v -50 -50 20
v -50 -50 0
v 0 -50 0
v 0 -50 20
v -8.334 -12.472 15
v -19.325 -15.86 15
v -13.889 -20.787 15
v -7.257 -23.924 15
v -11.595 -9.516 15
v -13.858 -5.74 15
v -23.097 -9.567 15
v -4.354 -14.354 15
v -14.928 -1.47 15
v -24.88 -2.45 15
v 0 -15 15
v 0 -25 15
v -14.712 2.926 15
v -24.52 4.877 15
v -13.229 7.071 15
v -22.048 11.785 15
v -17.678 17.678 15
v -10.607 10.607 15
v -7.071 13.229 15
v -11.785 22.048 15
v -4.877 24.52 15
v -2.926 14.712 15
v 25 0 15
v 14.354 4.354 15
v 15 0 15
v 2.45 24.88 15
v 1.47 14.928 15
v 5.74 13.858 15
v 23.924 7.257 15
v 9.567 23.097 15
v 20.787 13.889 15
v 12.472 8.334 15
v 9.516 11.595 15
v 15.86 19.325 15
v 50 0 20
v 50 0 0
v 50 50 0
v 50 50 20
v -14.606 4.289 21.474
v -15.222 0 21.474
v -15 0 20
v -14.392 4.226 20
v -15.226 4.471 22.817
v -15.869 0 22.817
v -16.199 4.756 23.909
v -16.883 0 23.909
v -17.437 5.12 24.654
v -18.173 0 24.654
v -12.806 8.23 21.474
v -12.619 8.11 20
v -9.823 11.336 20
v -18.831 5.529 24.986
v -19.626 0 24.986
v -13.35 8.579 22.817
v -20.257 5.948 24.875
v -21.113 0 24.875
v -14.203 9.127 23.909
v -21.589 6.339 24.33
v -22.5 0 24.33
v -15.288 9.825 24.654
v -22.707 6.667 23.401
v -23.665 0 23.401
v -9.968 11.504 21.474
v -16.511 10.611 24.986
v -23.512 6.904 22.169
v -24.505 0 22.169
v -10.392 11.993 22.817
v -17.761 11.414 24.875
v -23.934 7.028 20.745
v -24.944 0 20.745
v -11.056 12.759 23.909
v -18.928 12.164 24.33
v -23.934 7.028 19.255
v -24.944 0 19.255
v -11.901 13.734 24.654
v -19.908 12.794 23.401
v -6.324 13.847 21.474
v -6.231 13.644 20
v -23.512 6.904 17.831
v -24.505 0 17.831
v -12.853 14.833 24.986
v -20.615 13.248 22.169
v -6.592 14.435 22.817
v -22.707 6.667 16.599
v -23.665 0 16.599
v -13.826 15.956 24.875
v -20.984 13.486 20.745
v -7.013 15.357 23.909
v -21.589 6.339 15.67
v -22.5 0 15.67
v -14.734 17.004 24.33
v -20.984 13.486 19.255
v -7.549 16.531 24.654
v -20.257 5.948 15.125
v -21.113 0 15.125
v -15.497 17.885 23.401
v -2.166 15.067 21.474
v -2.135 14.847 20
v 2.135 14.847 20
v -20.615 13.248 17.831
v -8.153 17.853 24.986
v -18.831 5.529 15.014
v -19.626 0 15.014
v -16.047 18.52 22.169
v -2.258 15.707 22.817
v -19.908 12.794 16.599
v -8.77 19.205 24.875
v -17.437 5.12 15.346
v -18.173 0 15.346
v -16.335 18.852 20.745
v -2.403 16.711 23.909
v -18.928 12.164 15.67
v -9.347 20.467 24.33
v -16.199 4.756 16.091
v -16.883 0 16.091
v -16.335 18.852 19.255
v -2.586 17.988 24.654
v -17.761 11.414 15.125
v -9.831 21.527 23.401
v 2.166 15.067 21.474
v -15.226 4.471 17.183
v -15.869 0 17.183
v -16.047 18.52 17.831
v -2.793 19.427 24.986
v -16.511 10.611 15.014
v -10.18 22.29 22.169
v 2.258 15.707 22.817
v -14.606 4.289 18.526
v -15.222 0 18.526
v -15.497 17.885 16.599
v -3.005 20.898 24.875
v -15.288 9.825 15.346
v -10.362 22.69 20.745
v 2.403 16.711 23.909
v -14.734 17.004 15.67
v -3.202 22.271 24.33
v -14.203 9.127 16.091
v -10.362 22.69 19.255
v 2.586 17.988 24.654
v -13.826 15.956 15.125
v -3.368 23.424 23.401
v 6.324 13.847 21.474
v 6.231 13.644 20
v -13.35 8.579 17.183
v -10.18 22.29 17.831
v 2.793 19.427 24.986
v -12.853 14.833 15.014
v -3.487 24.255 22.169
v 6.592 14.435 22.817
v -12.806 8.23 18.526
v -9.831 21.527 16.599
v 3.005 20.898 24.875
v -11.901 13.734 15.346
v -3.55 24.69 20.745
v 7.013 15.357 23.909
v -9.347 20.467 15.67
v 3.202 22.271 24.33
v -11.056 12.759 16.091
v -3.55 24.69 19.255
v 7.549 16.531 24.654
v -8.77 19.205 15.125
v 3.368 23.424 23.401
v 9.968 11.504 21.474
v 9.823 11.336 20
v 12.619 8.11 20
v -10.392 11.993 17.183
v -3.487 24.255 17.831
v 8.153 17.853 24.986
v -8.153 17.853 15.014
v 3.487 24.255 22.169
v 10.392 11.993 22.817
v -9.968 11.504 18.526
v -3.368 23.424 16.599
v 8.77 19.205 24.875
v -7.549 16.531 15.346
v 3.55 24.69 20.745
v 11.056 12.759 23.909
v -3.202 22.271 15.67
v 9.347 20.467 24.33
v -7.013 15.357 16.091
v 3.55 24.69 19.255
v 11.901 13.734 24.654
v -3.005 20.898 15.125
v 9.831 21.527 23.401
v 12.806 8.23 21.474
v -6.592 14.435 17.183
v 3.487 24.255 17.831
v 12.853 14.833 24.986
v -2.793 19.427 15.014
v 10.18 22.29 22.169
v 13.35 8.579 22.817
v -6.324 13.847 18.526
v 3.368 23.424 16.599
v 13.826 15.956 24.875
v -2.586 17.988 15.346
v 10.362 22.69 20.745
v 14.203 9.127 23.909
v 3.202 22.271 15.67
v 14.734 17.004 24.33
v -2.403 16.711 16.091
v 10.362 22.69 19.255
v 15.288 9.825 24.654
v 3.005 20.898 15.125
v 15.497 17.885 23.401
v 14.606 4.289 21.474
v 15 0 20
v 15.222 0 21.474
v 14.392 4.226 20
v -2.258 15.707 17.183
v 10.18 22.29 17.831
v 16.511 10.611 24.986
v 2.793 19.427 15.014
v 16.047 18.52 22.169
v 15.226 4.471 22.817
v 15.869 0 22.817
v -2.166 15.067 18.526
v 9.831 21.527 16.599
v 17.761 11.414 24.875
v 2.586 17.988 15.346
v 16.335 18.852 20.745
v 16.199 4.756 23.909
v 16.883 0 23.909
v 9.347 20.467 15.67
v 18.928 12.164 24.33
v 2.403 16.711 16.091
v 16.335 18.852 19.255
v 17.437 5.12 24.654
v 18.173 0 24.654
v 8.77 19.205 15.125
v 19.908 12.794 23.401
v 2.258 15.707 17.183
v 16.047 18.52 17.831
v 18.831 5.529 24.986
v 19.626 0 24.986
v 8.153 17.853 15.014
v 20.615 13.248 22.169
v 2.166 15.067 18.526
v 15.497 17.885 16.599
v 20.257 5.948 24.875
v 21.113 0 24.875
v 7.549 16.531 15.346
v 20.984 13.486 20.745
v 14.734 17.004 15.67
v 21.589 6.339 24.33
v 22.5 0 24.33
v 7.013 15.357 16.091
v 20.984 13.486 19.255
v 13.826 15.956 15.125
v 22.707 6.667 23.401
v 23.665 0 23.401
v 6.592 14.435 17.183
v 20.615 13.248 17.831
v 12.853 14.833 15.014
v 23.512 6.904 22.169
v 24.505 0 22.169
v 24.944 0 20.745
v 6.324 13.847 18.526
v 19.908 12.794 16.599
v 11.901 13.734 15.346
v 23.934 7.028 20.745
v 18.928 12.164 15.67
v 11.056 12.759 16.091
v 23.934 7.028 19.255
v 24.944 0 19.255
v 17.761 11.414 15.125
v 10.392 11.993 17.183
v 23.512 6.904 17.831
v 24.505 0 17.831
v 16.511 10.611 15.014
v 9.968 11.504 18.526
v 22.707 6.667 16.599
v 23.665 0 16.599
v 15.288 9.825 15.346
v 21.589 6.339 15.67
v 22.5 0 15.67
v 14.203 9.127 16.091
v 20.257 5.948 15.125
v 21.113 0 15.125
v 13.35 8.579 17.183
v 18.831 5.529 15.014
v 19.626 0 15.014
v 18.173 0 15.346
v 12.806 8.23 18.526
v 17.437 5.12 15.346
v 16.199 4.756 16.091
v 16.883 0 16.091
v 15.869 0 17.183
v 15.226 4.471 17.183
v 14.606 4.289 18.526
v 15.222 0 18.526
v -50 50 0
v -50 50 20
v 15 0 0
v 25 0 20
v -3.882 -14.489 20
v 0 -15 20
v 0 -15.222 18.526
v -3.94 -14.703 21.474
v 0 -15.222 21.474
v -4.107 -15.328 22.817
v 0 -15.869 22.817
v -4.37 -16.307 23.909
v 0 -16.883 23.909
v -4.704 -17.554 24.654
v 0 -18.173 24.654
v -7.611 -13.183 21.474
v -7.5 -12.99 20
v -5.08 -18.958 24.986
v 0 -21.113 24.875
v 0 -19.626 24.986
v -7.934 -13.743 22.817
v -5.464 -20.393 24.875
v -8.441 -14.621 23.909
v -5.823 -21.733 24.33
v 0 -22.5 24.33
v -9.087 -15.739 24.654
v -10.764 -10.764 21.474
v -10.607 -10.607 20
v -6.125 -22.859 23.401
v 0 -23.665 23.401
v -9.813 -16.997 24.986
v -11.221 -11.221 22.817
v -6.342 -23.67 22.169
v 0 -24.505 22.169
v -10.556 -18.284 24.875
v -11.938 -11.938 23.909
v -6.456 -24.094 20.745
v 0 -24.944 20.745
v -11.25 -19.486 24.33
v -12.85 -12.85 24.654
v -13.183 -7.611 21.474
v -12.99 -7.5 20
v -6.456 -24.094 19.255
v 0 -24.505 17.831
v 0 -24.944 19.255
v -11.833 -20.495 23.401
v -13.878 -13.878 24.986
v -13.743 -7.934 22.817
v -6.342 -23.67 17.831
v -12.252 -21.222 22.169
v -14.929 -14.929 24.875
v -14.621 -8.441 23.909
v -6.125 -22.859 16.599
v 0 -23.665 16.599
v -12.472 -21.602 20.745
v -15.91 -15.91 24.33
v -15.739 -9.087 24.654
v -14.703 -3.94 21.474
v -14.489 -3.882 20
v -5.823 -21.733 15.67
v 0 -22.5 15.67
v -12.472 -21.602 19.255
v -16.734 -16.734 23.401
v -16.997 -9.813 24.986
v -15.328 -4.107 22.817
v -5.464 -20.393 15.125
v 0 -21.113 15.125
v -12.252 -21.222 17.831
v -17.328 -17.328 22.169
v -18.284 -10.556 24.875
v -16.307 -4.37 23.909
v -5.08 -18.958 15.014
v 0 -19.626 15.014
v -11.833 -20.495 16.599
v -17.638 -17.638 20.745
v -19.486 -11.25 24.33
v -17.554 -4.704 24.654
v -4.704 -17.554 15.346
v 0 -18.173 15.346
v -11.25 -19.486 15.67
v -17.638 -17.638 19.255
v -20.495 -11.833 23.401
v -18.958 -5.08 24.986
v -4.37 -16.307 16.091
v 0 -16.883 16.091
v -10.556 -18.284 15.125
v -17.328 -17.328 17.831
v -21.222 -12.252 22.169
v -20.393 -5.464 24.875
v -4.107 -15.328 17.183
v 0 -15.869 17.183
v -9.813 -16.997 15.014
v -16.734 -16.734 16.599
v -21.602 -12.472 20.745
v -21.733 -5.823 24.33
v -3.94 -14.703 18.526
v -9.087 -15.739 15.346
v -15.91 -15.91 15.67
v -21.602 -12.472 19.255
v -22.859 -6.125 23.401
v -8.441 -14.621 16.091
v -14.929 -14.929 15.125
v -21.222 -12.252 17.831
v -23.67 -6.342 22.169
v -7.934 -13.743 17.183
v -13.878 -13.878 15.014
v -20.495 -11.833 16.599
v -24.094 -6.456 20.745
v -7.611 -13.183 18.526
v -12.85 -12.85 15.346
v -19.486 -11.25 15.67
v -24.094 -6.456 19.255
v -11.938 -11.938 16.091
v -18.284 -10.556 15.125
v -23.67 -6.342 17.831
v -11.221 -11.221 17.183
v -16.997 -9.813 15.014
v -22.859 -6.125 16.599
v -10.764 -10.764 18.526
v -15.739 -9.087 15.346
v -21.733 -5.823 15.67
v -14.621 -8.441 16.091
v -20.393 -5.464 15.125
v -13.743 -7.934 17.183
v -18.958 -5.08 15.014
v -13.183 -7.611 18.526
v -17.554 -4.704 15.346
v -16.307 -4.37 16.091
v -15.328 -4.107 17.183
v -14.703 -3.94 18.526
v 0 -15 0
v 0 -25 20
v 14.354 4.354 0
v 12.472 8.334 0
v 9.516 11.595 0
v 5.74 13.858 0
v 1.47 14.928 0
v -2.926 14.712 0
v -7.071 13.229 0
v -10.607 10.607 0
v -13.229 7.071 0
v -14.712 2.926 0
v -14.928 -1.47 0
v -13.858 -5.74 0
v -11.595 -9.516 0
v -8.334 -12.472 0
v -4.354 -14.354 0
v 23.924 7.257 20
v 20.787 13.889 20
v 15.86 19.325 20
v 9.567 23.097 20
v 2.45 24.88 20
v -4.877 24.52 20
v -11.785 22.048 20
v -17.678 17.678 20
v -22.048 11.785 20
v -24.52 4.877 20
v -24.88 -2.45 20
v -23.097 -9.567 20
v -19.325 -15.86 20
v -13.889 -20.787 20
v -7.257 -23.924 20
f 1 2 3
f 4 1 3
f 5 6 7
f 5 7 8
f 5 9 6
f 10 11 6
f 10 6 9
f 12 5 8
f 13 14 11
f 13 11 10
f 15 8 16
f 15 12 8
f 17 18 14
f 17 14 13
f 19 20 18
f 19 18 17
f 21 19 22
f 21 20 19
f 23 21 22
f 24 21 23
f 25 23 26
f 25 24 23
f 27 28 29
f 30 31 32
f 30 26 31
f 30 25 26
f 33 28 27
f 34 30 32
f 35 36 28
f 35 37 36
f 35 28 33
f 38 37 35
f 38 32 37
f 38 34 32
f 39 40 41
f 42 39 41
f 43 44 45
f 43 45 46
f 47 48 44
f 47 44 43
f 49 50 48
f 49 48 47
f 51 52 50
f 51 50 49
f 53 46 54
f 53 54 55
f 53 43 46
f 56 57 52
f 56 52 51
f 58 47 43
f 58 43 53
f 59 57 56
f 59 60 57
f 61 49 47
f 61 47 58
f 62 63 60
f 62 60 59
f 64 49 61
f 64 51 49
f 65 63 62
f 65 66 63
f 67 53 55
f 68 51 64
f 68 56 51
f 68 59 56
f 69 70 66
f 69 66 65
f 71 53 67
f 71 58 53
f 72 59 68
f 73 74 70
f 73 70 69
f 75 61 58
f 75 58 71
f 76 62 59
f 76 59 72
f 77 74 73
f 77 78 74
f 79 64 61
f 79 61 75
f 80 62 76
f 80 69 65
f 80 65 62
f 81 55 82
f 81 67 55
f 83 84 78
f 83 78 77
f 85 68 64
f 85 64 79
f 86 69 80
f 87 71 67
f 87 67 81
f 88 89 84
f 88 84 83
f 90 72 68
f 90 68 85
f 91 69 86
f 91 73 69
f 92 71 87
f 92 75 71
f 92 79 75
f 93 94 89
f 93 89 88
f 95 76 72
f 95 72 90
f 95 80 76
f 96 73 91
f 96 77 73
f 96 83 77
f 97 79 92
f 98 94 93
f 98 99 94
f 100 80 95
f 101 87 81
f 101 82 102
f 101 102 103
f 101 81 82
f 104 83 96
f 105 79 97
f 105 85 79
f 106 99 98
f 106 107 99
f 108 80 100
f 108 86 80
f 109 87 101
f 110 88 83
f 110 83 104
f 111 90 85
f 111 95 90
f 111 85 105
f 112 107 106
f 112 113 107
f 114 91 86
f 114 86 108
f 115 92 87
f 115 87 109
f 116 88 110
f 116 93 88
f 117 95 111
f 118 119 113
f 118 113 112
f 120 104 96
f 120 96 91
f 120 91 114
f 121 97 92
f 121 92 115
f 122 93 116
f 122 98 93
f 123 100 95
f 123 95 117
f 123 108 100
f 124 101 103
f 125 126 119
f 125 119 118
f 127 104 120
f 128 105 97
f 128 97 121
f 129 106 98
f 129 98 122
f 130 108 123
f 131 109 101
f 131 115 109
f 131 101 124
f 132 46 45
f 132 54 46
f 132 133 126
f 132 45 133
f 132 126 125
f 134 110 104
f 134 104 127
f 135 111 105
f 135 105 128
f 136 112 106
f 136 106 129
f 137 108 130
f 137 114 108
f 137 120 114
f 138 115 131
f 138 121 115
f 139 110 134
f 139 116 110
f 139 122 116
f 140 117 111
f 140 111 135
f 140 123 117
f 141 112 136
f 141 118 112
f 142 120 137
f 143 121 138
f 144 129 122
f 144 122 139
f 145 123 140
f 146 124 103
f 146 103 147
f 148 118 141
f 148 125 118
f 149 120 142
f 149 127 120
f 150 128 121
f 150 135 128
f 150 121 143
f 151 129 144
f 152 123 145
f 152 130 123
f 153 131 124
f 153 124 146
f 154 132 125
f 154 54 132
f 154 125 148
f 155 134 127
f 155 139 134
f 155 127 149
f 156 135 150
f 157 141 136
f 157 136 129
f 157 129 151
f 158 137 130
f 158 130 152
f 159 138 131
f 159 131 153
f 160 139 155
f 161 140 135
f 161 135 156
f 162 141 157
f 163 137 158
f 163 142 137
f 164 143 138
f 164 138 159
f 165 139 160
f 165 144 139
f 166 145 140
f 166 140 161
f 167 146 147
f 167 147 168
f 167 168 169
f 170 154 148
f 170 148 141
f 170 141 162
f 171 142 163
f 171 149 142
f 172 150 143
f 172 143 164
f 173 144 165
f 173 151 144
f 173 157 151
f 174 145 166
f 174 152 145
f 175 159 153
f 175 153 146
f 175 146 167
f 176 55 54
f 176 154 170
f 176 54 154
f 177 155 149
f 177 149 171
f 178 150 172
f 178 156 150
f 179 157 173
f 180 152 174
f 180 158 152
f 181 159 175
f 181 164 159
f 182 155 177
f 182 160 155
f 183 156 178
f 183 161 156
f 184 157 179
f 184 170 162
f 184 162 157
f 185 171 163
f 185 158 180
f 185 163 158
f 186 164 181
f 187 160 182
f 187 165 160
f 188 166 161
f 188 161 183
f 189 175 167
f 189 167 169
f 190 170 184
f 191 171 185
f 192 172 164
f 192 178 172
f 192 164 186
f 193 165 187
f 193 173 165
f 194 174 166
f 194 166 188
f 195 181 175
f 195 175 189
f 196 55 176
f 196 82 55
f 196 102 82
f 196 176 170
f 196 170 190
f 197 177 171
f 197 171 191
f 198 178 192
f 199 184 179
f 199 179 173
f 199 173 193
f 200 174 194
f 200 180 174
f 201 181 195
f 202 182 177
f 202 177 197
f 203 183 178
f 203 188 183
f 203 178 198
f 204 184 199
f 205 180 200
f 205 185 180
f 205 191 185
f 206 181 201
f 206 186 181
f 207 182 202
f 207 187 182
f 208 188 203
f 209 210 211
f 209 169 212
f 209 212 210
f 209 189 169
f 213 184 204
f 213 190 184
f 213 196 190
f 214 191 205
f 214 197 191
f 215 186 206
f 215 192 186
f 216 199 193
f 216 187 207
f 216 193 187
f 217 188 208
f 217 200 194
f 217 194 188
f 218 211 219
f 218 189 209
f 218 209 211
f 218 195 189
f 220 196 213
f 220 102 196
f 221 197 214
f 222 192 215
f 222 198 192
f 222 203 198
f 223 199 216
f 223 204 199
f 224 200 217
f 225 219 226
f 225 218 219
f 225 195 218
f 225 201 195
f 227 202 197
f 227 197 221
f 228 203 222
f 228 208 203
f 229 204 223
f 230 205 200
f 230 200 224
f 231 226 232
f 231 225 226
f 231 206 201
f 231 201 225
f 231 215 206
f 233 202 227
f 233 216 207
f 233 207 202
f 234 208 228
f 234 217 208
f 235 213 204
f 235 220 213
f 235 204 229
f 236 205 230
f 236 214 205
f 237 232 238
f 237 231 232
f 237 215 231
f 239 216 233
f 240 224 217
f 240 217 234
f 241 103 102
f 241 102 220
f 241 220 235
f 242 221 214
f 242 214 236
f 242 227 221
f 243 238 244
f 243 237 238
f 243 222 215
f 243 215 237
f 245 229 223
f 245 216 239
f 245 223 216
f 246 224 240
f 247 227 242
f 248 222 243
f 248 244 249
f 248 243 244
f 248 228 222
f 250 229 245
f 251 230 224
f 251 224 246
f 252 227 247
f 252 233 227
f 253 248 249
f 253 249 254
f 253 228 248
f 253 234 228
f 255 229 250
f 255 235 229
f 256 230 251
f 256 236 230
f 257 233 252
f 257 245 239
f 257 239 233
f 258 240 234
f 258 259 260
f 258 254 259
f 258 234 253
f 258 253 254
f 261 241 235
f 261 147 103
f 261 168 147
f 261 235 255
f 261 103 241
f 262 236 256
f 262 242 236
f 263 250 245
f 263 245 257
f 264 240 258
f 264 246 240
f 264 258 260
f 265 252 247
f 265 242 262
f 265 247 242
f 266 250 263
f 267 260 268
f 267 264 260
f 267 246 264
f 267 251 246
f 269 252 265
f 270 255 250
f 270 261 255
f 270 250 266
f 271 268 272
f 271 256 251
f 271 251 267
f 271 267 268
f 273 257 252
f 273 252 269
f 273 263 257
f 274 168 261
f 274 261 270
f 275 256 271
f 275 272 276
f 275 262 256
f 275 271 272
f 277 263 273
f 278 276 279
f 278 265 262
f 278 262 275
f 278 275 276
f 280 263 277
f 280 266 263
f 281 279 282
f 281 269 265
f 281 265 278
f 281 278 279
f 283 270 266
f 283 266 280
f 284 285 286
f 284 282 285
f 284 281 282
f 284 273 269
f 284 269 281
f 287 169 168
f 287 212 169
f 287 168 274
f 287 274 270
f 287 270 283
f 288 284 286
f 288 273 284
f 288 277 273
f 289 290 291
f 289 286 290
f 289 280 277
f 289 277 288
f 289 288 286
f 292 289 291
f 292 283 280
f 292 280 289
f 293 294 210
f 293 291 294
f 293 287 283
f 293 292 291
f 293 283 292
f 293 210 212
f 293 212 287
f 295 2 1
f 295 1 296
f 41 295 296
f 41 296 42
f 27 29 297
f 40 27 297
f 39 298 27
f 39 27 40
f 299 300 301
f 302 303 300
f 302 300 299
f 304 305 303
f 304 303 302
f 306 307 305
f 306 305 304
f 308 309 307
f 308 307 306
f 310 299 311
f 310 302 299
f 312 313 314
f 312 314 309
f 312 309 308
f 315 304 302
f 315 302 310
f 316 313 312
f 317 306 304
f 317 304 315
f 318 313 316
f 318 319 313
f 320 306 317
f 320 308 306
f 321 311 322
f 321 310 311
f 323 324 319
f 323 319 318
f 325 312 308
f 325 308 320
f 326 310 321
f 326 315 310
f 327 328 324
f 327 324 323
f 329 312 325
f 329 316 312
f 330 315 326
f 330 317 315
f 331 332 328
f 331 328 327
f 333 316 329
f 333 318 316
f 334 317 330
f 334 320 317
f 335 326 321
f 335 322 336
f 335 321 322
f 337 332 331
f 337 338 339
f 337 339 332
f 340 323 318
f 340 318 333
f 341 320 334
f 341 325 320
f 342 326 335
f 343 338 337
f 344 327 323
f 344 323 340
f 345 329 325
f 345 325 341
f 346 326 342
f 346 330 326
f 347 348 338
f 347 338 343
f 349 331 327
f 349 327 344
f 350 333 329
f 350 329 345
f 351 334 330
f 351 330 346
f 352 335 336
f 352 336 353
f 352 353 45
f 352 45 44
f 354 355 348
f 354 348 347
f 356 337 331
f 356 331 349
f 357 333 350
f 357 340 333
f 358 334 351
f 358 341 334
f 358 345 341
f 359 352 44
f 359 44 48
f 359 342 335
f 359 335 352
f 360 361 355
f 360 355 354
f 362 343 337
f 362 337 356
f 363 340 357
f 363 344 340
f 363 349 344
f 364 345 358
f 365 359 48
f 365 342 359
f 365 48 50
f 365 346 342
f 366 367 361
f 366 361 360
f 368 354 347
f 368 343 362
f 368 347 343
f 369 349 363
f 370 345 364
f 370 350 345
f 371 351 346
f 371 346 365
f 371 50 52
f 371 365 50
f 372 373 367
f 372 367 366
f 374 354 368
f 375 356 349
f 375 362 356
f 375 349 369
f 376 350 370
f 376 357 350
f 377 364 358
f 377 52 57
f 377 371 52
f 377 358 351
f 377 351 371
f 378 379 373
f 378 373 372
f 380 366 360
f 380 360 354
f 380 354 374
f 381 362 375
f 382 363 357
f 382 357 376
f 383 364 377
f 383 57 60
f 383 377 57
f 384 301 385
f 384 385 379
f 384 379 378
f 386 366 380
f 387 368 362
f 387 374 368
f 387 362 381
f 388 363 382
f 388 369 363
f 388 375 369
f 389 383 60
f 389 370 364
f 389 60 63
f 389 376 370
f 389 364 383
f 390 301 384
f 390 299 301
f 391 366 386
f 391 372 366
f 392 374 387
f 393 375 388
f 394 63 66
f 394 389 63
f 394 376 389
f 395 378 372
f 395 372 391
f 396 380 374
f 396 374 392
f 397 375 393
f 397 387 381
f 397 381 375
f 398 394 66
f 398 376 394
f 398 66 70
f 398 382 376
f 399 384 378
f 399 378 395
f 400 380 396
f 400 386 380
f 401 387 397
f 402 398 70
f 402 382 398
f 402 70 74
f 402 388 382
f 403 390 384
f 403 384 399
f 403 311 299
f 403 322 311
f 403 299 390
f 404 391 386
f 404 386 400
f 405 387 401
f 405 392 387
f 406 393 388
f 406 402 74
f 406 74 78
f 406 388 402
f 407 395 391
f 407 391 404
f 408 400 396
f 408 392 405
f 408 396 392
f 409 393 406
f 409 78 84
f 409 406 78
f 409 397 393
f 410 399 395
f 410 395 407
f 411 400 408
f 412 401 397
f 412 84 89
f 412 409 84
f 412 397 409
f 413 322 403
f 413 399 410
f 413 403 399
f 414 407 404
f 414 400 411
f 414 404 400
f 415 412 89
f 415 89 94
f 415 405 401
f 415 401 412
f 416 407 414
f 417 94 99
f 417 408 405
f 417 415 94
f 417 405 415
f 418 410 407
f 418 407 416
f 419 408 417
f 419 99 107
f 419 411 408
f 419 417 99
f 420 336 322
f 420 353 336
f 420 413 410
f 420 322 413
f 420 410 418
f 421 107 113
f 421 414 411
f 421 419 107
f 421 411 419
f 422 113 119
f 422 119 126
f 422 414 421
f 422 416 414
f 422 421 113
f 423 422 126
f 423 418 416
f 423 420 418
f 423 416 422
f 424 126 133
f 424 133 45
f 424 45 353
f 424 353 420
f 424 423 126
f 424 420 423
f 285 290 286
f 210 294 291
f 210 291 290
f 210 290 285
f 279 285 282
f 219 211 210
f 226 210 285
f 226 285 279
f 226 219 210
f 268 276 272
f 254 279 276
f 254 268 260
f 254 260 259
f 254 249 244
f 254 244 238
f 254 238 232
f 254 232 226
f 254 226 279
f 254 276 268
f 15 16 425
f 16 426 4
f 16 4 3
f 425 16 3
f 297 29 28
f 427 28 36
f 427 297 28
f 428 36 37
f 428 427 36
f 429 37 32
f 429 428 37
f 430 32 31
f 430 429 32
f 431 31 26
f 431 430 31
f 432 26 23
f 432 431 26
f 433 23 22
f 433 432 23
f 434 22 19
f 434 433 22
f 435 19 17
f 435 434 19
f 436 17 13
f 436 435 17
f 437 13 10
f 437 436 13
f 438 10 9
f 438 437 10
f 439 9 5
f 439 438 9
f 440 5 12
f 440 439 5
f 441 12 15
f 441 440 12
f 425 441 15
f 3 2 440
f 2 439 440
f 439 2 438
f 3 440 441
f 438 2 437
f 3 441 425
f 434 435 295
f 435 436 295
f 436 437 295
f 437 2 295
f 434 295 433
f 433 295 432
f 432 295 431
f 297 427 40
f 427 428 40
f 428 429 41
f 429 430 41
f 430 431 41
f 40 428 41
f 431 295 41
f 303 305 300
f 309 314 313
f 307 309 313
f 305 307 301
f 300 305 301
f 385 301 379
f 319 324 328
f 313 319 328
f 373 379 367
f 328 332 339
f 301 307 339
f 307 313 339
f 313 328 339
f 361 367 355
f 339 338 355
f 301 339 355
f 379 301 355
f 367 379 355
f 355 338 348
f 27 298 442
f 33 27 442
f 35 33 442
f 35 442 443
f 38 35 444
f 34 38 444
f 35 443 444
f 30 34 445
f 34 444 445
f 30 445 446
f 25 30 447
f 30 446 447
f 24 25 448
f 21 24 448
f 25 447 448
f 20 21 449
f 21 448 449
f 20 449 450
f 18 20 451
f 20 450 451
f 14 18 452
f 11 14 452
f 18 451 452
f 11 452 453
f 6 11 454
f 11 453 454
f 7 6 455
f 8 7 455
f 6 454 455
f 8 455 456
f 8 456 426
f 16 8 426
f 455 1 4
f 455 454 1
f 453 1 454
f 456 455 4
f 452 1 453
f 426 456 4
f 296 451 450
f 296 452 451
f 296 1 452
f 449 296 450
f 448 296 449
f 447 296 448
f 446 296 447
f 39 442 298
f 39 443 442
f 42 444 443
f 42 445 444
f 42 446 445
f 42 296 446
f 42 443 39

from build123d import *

# Parameters (mm, degrees)
F0_W     = 100
F0_H     = 100
F0_R     = 15
F1_DEPTH = 20
F2_R     = 25
F2_R_2   = 15
F3_DEPTH = 5
F4_R     = 5
F6_W     = 50
F6_H     = 10
F6_H_2   = 20
F7_DEPTH = 50


with BuildPart() as f1:
    # F0 (on Top) → F1 (new body)
    with BuildSketch(Plane.XY):
        Rectangle(F0_W, F0_H)
        Circle(F0_R, mode=Mode.SUBTRACT)
    extrude(amount=F1_DEPTH)

    # F2 (on face) → F3 (cut)
    with BuildSketch(Plane.XY.offset(20)):
        Circle(F2_R)
        Circle(F2_R_2, mode=Mode.SUBTRACT)
    extrude(amount=-F3_DEPTH, mode=Mode.SUBTRACT)


with BuildPart() as f5:
    # F4 (on Front) → F5 (revolve)
    with BuildSketch(Plane.XZ):
        with Locations((-20, 20)):
            Circle(F4_R)
    revolve(axis=Axis((0, 0, 0), (0, 0, -1)))


with BuildPart() as f7_tool:
    # F6 (on face) → F7 (new body)
    with BuildSketch(Plane.XZ.offset(50)):
        with Locations((25, 25)):
            Rectangle(F6_W, F6_H)
        with Locations((25, 10)):
            Rectangle(F6_W, F6_H_2)
    extrude(amount=-F7_DEPTH)


with BuildPart() as f1_1:
    add(f1.part)

    # F7: cut by f7_tool
    add(f7_tool.part, mode=Mode.SUBTRACT)


with BuildPart() as f5_1:
    add(f5.part)

    # F7: cut by f7_tool
    add(f7_tool.part, mode=Mode.SUBTRACT)


solid = Compound([f1_1.part, f5_1.part])
